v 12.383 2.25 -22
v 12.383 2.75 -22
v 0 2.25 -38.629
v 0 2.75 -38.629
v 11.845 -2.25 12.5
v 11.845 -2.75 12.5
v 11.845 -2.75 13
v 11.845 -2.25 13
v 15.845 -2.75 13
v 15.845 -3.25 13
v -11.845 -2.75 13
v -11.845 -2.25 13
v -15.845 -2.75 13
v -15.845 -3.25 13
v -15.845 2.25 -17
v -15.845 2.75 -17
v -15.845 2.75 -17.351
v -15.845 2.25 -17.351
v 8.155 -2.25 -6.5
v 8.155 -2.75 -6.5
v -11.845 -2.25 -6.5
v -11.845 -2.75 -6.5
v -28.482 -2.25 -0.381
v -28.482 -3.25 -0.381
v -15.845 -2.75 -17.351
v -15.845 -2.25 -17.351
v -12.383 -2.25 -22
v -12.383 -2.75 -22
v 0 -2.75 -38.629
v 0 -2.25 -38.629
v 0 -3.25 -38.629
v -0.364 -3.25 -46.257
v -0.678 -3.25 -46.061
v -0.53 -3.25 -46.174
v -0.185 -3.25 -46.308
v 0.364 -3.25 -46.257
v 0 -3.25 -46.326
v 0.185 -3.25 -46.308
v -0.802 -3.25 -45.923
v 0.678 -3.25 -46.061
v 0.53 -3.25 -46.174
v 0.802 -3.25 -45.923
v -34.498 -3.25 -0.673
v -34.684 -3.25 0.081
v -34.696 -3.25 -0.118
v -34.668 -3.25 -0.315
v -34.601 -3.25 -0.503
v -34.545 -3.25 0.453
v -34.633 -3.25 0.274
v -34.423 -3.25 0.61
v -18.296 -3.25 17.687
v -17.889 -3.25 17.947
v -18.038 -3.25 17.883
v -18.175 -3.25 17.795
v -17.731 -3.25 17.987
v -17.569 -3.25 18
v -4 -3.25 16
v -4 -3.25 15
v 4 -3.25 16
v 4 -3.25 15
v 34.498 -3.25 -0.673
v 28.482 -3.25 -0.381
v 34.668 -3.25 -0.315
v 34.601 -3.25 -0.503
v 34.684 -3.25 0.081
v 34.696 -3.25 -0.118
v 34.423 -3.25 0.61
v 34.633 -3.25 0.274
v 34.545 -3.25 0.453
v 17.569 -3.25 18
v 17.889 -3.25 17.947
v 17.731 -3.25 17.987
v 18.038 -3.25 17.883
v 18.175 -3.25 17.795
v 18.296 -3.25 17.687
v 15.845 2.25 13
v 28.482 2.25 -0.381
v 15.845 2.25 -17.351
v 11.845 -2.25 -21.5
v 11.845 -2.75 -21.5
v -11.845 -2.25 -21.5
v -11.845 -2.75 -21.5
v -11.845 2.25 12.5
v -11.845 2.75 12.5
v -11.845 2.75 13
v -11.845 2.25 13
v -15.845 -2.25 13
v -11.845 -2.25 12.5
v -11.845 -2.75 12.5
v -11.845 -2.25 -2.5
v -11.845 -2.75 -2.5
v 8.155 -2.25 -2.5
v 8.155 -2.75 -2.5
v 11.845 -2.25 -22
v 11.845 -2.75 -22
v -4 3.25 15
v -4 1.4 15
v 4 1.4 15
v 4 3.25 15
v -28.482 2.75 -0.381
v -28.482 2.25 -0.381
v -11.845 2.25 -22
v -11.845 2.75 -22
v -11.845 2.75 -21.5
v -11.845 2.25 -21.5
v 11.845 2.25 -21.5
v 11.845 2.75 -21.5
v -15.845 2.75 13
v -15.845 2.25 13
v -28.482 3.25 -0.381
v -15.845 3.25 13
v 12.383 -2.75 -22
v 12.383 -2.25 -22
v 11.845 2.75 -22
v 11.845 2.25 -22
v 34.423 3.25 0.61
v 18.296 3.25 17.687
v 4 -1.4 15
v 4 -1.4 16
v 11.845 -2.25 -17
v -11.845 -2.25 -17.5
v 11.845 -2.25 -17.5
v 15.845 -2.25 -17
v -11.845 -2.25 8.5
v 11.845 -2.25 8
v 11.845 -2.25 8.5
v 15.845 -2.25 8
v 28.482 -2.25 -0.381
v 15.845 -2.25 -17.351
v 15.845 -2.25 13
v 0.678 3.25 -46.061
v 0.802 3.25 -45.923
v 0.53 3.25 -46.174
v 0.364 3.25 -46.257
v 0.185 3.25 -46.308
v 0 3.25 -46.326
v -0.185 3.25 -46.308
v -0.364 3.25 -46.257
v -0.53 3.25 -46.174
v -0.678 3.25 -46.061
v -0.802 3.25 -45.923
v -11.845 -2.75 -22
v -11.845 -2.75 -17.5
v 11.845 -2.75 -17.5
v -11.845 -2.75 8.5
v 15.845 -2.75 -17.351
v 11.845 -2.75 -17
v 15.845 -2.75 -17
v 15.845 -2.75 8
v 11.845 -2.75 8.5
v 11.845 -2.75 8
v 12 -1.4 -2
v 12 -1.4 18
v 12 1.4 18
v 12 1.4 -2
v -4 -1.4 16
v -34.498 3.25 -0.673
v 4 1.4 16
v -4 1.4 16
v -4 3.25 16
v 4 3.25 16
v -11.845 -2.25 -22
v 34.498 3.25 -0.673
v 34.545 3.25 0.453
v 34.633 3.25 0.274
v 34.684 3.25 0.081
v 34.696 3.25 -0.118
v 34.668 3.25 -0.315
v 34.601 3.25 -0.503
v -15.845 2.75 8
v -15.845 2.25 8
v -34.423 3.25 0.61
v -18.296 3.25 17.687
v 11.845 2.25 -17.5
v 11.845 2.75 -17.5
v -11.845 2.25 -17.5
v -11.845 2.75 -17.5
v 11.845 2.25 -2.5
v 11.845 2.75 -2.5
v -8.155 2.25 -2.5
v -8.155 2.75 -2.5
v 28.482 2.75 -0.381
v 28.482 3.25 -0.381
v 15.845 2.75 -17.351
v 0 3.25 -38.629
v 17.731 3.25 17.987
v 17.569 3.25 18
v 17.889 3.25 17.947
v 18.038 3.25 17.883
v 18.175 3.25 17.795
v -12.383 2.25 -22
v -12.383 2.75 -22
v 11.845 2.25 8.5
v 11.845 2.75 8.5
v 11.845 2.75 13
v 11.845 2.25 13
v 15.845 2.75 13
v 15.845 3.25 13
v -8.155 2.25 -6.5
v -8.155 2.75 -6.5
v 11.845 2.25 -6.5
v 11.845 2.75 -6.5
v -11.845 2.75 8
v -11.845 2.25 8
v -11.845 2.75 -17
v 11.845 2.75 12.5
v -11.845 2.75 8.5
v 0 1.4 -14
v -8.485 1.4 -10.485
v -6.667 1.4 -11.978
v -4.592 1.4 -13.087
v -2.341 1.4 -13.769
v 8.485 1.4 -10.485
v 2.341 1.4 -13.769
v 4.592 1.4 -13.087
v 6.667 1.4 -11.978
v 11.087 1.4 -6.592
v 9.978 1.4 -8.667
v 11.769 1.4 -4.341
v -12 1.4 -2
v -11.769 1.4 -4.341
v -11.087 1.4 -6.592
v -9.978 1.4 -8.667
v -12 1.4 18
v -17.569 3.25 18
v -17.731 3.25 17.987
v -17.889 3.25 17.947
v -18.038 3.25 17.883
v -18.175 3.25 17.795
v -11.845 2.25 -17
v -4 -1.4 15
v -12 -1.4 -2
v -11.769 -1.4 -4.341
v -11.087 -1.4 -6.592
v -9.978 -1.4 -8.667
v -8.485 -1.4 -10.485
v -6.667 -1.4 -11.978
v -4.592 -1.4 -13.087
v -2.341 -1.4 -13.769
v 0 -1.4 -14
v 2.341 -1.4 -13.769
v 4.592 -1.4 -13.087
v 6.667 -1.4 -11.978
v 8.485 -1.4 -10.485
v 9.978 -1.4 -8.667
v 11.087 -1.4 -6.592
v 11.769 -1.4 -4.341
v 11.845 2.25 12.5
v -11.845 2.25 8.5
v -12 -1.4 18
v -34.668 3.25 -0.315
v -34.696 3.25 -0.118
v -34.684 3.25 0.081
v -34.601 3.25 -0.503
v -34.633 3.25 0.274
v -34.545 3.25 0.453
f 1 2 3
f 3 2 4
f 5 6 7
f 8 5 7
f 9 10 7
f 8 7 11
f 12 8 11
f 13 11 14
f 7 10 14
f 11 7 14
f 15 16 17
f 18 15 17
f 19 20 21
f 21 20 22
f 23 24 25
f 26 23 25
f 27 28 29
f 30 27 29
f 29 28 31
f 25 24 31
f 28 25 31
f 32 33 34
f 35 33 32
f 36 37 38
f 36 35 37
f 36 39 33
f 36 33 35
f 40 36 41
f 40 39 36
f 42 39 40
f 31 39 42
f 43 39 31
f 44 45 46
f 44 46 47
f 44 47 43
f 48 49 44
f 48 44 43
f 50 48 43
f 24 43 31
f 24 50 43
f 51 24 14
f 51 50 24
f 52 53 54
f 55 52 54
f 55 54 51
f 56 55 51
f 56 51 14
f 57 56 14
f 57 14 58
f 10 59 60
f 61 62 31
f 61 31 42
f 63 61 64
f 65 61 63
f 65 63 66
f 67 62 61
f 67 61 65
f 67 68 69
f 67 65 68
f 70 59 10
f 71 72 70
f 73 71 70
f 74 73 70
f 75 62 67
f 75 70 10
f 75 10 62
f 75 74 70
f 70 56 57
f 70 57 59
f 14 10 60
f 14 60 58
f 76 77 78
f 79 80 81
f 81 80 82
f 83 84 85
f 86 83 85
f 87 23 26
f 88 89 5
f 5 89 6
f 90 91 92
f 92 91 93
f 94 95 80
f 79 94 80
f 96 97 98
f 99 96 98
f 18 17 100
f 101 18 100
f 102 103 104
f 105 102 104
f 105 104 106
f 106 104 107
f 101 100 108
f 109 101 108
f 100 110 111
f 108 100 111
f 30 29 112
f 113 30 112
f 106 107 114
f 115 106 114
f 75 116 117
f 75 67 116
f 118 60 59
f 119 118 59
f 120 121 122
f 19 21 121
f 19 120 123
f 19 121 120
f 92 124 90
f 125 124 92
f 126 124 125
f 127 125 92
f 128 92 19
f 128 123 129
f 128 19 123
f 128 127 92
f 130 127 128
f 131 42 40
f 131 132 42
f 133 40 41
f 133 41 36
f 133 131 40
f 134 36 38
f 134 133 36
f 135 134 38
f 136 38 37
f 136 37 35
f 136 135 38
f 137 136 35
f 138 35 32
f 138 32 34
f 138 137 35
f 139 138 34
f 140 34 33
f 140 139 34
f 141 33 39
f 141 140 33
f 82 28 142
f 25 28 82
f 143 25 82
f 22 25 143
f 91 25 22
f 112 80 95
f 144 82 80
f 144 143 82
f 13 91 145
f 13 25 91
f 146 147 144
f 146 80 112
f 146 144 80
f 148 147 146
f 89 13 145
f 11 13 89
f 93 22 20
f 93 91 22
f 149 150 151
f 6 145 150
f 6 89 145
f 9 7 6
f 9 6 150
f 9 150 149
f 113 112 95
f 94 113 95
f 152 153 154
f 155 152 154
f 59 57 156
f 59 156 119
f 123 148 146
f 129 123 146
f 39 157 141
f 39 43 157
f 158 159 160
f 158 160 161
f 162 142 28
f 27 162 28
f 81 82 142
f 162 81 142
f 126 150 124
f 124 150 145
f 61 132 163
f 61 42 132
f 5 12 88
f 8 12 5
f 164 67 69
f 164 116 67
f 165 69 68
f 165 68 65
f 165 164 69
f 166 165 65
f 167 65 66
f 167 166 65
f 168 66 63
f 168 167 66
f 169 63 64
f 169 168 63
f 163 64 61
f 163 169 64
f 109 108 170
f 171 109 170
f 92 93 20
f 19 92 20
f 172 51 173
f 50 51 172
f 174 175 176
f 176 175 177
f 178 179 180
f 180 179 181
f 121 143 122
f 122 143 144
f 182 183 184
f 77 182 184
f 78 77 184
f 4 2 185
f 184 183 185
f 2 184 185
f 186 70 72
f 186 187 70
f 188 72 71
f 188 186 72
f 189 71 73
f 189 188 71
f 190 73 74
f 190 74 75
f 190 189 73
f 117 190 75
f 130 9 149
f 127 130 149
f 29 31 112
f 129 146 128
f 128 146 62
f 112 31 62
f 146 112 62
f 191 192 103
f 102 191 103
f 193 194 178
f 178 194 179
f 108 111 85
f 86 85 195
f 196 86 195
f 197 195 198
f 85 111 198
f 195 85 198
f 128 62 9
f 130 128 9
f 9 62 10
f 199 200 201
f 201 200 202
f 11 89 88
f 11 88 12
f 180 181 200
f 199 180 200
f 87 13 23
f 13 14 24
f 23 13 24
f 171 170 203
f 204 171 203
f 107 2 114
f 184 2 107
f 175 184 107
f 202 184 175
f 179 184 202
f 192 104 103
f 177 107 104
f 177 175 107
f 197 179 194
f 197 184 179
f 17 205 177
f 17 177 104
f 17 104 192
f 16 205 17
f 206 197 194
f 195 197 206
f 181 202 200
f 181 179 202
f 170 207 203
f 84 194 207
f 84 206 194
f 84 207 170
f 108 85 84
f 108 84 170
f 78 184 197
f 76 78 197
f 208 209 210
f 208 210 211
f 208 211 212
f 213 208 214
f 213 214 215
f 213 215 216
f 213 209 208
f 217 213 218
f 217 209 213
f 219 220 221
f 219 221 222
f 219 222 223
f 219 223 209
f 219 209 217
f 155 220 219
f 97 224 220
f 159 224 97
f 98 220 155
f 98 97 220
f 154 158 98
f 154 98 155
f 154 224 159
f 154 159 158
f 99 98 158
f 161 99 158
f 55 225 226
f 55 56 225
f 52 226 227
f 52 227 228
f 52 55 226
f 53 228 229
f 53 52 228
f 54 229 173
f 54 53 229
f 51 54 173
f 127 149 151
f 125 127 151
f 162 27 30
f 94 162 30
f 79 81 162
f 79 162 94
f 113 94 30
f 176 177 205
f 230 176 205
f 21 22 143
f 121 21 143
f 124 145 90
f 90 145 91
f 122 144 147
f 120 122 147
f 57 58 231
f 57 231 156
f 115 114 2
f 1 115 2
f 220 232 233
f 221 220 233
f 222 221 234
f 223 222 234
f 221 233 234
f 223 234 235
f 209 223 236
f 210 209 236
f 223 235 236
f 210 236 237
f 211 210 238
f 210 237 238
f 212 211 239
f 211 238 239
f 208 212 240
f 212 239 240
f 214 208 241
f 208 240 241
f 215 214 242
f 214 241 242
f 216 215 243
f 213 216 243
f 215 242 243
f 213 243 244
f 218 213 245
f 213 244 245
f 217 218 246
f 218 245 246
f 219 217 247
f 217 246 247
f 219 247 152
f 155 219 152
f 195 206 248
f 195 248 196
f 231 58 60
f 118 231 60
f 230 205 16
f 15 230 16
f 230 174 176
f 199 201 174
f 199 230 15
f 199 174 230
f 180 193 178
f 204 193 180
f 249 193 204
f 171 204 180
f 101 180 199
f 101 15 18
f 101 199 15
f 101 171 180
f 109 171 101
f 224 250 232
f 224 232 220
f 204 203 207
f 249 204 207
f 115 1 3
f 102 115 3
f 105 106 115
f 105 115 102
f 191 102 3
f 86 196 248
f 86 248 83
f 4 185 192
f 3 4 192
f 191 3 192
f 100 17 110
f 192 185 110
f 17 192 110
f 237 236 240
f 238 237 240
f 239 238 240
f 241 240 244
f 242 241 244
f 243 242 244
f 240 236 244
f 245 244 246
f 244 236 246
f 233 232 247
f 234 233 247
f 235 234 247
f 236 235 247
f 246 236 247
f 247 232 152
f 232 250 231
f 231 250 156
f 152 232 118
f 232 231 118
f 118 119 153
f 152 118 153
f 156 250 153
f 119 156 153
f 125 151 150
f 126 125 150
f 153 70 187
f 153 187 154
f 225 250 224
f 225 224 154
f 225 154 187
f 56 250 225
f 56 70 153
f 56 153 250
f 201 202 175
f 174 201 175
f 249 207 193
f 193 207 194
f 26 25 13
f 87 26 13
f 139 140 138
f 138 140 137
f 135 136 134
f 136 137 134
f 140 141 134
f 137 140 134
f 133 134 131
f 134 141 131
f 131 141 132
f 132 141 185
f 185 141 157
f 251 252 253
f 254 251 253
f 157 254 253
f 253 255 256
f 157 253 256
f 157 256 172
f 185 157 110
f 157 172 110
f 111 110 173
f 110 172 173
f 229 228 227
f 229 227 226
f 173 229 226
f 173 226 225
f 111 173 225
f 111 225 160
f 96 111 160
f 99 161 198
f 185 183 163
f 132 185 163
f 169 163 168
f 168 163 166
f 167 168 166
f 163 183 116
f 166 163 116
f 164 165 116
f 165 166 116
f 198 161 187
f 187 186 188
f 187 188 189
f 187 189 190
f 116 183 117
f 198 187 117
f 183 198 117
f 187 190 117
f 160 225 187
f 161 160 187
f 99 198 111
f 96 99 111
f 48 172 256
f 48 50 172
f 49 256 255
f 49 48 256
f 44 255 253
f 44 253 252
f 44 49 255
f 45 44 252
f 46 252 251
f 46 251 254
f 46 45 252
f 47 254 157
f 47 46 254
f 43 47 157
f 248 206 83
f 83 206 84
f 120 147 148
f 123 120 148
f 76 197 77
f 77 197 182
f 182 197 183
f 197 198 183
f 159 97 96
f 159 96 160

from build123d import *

# Parameters (mm, degrees)
F1_DEPTH  = 3.25
F3_DEPTH  = 0.5
F5_DEPTH  = 0.5
F6_W      = 23.6895351076
F6_H      = 0.5
F7_DEPTH  = 0.5
F8_W      = 23.6895351076
F8_H      = 0.5000002682
F9_DEPTH  = 0.5
F10_W     = 24
F10_H     = 2.8
F11_DEPTH = 20
F13_DEPTH = 1.4
F14_W     = 8
F14_H     = 1
F15_DEPTH = 25
F16_R     = 1


# Not quite as in the source:
# - ends of sketch curves that miss each other by under 0.0002 mm in the source are joined


with BuildPart() as f1:
    # F0 (on Front) → F1 (new body, symmetric)
    with BuildSketch(Plane.XZ):
        Polygon((18, 18), (0, 18), (-18, 18), (-35, 0), (0, -47), (35, 0), align=None)
    extrude(amount=F1_DEPTH, both=True)

    # F2 (on face) → F3 (cut)
    with BuildSketch(Plane.XZ.offset(3.25)):
        Polygon((15.8447675538, 13), (-15.8447675538, 13), (-28.4822773709, -0.3808927475), (1.162e-07, -38.628522516), (28.4822775009, -0.3808928851), align=None)
    extrude(amount=-F3_DEPTH, mode=Mode.SUBTRACT)

    # F4 (on face) → F5 (cut)
    with BuildSketch(Plane(origin=(0, 3.25, 0), x_dir=(-1, 0, 0), z_dir=(0, 1, 0))):
        Polygon((28.482277527, -0.3808925379), (15.8447676545, 13.0000002682), (-15.8447670441, 13.0000002682), (-28.4822772579, -0.3808928993), (0, -38.6285223599), align=None)
    extrude(amount=-F5_DEPTH, mode=Mode.SUBTRACT)

    # F6 (on face) → F7 (cut)
    with BuildSketch(Plane.XZ.offset(2.75)):
        Polygon((-15.8447675538, -17.3512630734), (-15.8447675538, 13), (-28.4822773709, -0.3808927475), align=None)
        Polygon((28.4822775009, -0.3808928851), (15.8447675538, 13), (15.8447675538, 8), (11.8447675538, 8), (11.8447675538, 8.5), (-11.8447675538, 8.5), (-11.8447675538, -2.5), (8.1552324462, -2.5), (8.1552324462, -6.5), (-11.8447675538, -6.5), (-11.8447675538, -17.5), (11.8447675538, -17.5), (11.8447675538, -17), (15.8447675538, -17), (15.8447675538, -17.3512633855), align=None)
        with Locations((0, 12.75)):
            Rectangle(F6_W, F6_H)
        Polygon((-11.8447675538, -22), (-12.3829421829, -22), (1.162e-07, -38.628522516), (12.3829424153, -22), (11.8447675538, -22), (11.8447675538, -21.5), (-11.8447675538, -21.5), align=None)
    extrude(amount=-F7_DEPTH, mode=Mode.SUBTRACT)

    # F8 (on face) → F9 (cut)
    with BuildSketch(Plane(origin=(0, 2.75, 0), x_dir=(-1, 0, 0), z_dir=(0, 1, 0))):
        Polygon((-11.8447675538, -2.5), (8.1552324462, -2.5), (8.1552324462, -6.5), (-11.8447675538, -6.5), (-11.8447675538, -17.5), (11.8447675538, -17.5), (11.8447675538, -17), (15.8447675538, -17), (15.8447675538, -17.3512630734), (28.482277527, -0.3808925379), (15.8447676545, 13.0000002682), (15.8447675538, 8), (11.8447675538, 8), (11.8447675538, 8.5), (-11.8447675538, 8.5), align=None)
        Polygon((11.8447675538, -21.5), (-11.8447675538, -21.5), (-11.8447675538, -22), (-12.3829424153, -22), (0, -38.6285223599), (12.3829421829, -22), (11.8447675538, -22), align=None)
        Polygon((-15.8447675538, -17.3512630734), (-15.8447675538, 13), (-28.4822772579, -0.3808928993), align=None)
        with Locations((0, 12.7500001341)):
            Rectangle(F8_W, F8_H)
    extrude(amount=-F9_DEPTH, mode=Mode.SUBTRACT)

    # F10 (on face) → F11 (cut)
    with BuildSketch(Plane.XY.offset(18)):
        Rectangle(F10_W, F10_H)
    extrude(amount=-F11_DEPTH, mode=Mode.SUBTRACT)

    # F12 (on Front) → F13 (cut, symmetric)
    with BuildSketch(Plane.XZ):
        with BuildLine():
            Line((12, -2), (-12, -2))
            ThreePointArc((-12, -2), (0, -14), (12, -2))
        make_face()
    extrude(amount=F13_DEPTH, both=True, mode=Mode.SUBTRACT)

    # F14 (on face) → F15 (cut)
    with BuildSketch(Plane.XZ.offset(3.25)):
        with Locations((0, 15.5)):
            Rectangle(F14_W, F14_H)
    extrude(amount=-F15_DEPTH, mode=Mode.SUBTRACT)

    # F16
    f16_edges = [f1.edges().sort_by_distance(p)[0] for p in [
        (0, 0, -47),
        (35, 0, 0),
        (-35, 0, 0),
        (-18, 0, 18),
        (18, 0, 18),
    ]]
    fillet(f16_edges, radius=F16_R)


solid = f1.part
